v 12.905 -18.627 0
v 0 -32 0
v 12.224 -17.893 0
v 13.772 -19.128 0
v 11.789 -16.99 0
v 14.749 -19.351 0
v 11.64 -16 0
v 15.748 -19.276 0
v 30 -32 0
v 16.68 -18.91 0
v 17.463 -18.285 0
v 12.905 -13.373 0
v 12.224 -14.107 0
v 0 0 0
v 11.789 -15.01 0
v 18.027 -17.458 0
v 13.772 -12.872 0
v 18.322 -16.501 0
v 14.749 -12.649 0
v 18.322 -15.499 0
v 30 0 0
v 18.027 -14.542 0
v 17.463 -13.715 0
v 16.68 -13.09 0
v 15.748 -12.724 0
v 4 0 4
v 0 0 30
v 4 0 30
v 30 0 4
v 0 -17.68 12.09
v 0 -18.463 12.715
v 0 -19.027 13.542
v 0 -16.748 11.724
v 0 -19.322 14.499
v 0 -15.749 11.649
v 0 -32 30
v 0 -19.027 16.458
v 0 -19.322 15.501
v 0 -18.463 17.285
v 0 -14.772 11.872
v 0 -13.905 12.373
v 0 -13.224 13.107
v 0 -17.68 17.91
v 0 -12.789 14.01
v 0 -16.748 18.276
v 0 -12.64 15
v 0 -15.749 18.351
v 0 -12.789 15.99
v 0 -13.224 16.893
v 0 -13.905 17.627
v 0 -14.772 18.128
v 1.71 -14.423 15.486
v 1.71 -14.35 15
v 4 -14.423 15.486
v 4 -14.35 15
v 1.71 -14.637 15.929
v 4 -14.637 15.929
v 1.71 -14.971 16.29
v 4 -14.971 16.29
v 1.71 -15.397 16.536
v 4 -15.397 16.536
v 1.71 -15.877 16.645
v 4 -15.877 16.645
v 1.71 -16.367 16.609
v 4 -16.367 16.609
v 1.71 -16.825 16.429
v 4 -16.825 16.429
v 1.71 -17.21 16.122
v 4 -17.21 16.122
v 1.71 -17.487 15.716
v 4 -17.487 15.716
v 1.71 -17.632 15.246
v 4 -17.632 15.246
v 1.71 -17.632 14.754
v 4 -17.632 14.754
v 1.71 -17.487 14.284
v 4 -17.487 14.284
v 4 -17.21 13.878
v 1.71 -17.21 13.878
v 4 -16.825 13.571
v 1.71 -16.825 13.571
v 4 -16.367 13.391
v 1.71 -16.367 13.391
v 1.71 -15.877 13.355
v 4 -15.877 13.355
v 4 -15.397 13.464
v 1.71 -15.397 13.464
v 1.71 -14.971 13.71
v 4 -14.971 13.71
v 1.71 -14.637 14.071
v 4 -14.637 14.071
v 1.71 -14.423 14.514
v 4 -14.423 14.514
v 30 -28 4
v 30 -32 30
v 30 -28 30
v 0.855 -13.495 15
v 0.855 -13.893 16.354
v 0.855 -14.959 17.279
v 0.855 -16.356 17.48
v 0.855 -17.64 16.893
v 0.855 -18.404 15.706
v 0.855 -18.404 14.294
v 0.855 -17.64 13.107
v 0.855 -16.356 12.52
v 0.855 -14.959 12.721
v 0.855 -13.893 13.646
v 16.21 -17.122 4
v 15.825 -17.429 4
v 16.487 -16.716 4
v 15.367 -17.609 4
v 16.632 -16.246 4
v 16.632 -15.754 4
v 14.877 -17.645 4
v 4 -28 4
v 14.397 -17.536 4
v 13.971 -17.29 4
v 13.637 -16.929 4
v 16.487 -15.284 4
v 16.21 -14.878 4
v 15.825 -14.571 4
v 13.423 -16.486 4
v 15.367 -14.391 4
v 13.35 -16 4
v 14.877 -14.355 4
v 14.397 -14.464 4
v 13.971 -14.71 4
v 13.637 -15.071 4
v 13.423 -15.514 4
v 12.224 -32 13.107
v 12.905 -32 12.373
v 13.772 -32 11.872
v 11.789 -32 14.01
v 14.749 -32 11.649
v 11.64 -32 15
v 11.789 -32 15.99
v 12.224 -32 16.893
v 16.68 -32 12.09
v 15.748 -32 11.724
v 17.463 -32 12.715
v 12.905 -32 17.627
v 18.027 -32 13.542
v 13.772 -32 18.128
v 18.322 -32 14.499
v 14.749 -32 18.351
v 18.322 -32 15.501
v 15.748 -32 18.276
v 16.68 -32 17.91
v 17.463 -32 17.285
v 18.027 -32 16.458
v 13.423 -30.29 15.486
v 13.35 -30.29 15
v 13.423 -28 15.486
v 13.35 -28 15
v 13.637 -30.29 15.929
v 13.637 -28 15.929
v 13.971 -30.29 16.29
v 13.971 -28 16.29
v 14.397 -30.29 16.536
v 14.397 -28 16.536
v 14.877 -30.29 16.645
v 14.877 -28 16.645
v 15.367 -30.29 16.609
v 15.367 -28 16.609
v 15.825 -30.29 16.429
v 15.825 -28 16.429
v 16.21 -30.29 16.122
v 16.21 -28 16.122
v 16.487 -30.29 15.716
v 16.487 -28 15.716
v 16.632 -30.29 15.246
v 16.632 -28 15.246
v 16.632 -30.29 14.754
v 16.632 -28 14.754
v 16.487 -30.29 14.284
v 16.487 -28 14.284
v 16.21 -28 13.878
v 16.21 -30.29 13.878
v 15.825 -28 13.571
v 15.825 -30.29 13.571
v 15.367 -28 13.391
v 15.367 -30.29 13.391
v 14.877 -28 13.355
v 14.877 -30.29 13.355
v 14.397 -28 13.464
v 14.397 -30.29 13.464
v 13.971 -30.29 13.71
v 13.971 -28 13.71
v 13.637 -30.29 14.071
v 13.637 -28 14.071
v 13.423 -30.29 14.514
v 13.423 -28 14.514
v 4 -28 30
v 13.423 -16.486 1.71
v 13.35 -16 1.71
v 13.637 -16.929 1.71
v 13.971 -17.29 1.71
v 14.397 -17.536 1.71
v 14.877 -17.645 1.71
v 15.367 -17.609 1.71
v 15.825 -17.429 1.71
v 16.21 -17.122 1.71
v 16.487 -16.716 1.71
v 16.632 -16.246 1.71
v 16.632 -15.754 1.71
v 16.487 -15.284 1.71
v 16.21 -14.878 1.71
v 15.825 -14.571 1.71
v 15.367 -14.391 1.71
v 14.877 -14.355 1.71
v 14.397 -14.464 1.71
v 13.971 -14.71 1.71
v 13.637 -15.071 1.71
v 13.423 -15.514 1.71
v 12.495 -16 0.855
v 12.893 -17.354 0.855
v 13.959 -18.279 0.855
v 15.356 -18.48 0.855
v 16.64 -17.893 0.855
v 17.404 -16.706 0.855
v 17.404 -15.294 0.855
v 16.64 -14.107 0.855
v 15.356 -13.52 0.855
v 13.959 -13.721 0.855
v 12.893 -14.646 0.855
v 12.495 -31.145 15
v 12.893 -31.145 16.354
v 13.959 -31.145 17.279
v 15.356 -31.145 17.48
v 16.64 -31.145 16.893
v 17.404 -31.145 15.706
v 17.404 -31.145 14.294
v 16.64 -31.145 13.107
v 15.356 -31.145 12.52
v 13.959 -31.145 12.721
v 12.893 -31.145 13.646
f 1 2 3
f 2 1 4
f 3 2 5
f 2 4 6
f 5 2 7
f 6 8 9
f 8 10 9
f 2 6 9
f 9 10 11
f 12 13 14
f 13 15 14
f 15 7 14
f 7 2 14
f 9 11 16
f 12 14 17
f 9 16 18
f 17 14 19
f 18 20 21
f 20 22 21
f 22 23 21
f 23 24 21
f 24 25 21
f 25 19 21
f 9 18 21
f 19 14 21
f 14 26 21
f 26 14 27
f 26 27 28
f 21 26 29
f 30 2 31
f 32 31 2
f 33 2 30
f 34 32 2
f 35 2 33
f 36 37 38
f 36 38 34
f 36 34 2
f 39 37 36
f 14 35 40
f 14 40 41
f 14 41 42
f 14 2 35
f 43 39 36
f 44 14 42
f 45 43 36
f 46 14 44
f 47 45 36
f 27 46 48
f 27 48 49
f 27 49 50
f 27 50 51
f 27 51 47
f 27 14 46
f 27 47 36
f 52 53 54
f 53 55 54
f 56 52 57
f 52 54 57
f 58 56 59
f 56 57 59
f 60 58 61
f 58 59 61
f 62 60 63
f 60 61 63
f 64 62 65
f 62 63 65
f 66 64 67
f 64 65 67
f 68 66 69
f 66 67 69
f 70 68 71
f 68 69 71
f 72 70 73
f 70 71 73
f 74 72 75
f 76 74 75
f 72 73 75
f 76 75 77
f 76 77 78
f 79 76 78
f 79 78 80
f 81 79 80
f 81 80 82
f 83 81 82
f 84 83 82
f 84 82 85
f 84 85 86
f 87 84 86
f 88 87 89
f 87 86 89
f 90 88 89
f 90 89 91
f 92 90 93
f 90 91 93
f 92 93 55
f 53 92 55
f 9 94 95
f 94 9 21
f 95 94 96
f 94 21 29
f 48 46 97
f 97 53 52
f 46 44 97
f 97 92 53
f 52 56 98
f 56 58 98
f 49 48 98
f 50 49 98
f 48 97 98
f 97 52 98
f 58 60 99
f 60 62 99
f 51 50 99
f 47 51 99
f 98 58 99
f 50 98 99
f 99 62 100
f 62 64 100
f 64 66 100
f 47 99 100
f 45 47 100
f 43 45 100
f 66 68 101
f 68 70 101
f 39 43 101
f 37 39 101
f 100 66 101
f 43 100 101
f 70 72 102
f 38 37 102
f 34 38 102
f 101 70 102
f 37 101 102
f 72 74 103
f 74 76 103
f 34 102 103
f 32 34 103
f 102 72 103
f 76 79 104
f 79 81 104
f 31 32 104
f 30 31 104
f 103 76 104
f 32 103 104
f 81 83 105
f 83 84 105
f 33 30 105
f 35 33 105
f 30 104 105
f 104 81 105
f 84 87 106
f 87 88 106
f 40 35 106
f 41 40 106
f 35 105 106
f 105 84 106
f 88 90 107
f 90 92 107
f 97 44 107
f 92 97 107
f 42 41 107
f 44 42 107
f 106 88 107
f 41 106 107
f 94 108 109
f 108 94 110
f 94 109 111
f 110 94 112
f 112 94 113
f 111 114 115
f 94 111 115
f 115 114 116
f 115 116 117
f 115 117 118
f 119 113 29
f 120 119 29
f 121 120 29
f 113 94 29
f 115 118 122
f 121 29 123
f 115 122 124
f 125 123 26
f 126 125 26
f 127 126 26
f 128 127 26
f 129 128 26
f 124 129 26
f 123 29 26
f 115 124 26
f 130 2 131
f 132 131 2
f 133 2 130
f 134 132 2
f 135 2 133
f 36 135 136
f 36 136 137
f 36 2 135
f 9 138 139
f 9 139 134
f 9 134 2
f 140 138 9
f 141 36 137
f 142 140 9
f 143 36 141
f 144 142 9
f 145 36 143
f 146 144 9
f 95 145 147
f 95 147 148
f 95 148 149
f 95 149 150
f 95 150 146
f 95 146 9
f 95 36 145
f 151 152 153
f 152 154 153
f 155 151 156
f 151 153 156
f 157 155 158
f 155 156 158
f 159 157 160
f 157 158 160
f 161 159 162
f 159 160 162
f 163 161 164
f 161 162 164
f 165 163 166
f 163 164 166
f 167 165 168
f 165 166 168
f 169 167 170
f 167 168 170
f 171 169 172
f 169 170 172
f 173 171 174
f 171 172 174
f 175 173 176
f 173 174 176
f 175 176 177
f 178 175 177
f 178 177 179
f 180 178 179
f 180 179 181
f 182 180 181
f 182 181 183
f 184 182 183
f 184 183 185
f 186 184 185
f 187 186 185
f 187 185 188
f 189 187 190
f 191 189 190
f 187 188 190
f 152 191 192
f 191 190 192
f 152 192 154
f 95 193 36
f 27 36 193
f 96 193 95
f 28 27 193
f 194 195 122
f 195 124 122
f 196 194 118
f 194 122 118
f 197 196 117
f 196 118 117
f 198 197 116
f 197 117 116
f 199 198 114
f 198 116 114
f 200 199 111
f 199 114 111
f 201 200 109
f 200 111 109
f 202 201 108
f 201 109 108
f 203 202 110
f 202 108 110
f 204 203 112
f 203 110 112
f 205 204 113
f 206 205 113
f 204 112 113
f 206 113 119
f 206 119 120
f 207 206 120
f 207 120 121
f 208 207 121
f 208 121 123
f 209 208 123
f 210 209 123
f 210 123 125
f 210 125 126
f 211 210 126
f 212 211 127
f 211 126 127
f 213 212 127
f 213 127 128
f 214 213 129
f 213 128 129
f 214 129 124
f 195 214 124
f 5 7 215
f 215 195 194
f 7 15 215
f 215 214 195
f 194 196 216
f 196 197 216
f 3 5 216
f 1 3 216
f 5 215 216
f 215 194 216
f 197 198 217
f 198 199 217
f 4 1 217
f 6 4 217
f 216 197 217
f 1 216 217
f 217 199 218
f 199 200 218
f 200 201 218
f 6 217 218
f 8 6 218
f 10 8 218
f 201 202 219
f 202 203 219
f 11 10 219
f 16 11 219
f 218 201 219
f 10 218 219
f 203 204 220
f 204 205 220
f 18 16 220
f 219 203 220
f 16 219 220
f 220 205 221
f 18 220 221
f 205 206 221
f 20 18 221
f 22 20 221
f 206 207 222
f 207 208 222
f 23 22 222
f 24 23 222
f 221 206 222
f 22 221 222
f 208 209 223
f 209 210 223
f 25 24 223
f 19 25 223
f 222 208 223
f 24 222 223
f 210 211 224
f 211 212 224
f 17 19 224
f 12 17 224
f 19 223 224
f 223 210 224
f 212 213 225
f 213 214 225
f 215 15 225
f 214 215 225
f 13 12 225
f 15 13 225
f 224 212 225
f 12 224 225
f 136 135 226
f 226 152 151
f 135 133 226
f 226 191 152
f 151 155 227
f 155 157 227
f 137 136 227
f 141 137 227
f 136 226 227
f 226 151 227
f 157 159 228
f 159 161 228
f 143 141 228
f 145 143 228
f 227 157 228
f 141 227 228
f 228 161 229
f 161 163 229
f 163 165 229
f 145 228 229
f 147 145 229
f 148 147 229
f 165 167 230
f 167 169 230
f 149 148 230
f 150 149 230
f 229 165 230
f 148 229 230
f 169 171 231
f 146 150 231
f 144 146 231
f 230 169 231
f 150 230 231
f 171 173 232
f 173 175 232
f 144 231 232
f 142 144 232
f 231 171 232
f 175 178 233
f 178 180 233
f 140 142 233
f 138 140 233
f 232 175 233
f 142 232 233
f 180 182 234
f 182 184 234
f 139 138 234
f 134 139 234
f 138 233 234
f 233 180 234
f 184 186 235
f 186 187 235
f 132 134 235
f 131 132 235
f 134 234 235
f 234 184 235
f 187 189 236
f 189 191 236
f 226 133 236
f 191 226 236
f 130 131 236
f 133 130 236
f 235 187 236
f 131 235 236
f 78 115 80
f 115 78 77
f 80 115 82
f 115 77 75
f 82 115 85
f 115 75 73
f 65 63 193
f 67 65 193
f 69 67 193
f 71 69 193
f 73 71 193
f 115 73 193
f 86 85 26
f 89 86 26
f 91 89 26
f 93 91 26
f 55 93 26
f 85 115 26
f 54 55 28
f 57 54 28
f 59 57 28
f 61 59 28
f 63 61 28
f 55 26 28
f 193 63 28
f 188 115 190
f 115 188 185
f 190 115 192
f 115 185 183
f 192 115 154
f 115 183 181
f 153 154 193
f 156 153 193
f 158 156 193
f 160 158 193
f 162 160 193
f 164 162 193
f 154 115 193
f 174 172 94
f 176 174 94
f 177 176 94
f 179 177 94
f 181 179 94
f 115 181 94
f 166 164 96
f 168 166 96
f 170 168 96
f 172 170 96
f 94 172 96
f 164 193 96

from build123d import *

# Parameters (mm, degrees)
F1_DEPTH       = 28
F2_W           = 30
F2_H           = 30
F3_DEPTH       = 4
F5_D           = 3.3
F5_DEPTH       = 40
F5_CSINK_D     = 6.72
F5_CSINK_ANGLE = 90
F5_TIP         = 0.9914200214
F7_D           = 3.3
F7_DEPTH       = 40
F7_CSINK_D     = 6.72
F7_CSINK_ANGLE = 90
F7_TIP         = 0.9914200214
F9_D           = 3.3
F9_DEPTH       = 40
F9_CSINK_D     = 6.72
F9_CSINK_ANGLE = 90
F9_TIP         = 0.9914200214


with BuildPart() as f1:
    # F0 (on Front) → F1 (new body)
    with BuildSketch(Plane.XZ):
        Polygon((0, 4), (0, 0), (4, 0), (30, 0), (30, 4), (4, 4), (4, 30), (0, 30), align=None)
    extrude(amount=F1_DEPTH)

    # F2 (on face) → F3 (join)
    with BuildSketch(Plane.XZ.offset(28)):
        with Locations((15, 15)):
            Rectangle(F2_W, F2_H)
    extrude(amount=F3_DEPTH)

    # F5
    with Locations(Plane.XZ.offset(32)):
        with Locations((15, 15)):
            CounterSinkHole(F5_D / 2, F5_CSINK_D / 2, depth=F5_DEPTH, counter_sink_angle=F5_CSINK_ANGLE)
            with Locations((0, 0, -(F5_DEPTH + F5_TIP / 2))):  # 118° drill point
                Cone(0, F5_D / 2, F5_TIP, mode=Mode.SUBTRACT)

    # F7
    with Locations(Plane(origin=(0, 0, 0), x_dir=(0, -1, 0), z_dir=(-1, 0, 0))):
        with Locations((16, 15)):
            CounterSinkHole(F7_D / 2, F7_CSINK_D / 2, depth=F7_DEPTH, counter_sink_angle=F7_CSINK_ANGLE)
            with Locations((0, 0, -(F7_DEPTH + F7_TIP / 2))):  # 118° drill point
                Cone(0, F7_D / 2, F7_TIP, mode=Mode.SUBTRACT)

    # F9
    with Locations(Plane(origin=(0, 0, 0), x_dir=(1, 0, 0), z_dir=(0, 0, -1))):
        with Locations((15, 16)):
            CounterSinkHole(F9_D / 2, F9_CSINK_D / 2, depth=F9_DEPTH, counter_sink_angle=F9_CSINK_ANGLE)
            with Locations((0, 0, -(F9_DEPTH + F9_TIP / 2))):  # 118° drill point
                Cone(0, F9_D / 2, F9_TIP, mode=Mode.SUBTRACT)


solid = f1.part
